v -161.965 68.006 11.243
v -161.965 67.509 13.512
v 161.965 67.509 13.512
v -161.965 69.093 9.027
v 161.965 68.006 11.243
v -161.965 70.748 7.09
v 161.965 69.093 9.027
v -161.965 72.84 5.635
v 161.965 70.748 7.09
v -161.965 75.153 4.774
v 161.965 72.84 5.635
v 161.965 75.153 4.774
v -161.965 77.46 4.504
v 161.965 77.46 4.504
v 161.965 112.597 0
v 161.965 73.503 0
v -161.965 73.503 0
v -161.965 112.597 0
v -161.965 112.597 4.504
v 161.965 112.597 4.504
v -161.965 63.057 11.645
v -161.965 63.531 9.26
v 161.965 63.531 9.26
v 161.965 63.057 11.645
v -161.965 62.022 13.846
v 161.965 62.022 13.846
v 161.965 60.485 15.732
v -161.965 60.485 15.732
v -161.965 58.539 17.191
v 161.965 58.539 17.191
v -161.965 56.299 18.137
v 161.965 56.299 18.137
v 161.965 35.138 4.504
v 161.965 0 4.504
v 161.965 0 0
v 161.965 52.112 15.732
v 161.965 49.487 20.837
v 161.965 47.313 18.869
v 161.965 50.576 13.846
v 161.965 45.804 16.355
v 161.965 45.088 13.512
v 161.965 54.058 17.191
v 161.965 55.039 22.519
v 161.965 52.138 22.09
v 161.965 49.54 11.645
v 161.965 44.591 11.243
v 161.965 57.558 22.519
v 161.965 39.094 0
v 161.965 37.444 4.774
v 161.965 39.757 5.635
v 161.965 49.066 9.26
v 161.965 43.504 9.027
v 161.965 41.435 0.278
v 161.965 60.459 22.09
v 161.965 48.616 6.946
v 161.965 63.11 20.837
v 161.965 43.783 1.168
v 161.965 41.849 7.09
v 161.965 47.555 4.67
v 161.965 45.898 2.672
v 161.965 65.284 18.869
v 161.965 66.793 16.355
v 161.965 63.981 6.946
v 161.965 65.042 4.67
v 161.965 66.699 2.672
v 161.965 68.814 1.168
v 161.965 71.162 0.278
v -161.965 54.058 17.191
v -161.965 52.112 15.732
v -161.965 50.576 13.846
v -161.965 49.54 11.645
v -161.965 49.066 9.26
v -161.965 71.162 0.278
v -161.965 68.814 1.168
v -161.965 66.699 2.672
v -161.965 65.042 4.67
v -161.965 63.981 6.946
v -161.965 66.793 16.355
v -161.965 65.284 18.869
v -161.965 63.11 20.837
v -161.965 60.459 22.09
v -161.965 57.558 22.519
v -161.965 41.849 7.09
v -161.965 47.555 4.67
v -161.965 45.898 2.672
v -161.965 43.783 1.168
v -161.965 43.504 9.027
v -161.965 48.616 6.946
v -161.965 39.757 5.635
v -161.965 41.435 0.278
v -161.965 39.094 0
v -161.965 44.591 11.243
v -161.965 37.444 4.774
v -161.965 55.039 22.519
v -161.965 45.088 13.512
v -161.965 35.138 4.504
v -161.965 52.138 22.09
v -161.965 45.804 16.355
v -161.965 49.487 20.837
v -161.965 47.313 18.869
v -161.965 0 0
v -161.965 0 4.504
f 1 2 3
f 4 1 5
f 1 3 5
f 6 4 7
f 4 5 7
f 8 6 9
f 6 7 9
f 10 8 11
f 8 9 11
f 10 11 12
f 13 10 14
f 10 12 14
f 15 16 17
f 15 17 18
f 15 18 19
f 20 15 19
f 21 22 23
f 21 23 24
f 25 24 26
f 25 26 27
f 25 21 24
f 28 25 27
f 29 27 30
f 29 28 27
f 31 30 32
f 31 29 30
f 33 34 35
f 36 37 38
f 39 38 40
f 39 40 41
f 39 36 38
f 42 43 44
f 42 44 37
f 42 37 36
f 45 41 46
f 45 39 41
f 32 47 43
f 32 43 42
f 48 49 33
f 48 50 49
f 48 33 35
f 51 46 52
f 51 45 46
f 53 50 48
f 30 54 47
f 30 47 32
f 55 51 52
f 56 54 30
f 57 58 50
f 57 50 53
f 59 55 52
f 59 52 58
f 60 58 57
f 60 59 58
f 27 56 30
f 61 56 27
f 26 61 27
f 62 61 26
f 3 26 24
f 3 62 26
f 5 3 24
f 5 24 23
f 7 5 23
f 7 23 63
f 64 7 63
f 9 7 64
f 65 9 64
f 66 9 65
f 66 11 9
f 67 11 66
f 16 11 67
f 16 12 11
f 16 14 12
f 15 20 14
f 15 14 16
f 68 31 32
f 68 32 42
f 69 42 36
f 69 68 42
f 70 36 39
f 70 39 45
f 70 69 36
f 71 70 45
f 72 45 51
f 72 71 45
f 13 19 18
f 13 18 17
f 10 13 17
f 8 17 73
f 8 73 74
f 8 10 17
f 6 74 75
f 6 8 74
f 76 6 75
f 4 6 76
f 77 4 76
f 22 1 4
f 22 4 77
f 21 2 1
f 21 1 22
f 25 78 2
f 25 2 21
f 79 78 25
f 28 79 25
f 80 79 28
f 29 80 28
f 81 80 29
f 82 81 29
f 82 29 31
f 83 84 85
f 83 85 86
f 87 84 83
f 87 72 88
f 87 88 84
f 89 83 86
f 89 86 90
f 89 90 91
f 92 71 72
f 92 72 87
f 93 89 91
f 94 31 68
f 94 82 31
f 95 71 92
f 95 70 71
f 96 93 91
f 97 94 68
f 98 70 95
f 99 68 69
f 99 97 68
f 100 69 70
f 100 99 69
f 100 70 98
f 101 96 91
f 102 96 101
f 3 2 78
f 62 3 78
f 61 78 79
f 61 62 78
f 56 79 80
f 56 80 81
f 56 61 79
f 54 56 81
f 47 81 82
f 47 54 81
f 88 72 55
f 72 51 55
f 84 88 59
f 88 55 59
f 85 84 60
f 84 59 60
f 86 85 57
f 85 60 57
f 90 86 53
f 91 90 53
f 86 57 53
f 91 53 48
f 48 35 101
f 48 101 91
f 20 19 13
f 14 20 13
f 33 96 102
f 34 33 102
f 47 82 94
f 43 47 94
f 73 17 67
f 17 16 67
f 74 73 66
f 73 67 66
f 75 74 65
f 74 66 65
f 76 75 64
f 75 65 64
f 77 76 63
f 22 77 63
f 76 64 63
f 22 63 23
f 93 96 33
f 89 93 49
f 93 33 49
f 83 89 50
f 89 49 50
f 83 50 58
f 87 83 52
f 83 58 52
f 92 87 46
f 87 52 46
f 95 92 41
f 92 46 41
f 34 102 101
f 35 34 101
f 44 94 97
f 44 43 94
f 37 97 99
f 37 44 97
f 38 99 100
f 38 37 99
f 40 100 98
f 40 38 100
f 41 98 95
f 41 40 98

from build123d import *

# Parameters (mm, degrees)
SM_START               = -161.965
SM_BASE_FLANGE_1_DEPTH = 323.93
FILLET_3_R             = 10
FILLET_4_R             = 10
FILLET_5_R             = 10
FILLET_6_R             = 10
FILLET_7_R             = 10


# Read off the part's stored shape, not the designer's step: 基体-法兰1
with BuildPart() as part:
    # 基体-法兰1 outline → 基体-法兰1 (new body)
    with BuildSketch(Plane(origin=(0, 0, 0), x_dir=(0, 0, -1), z_dir=(1, 0, 0)).offset(SM_START)):
        Polygon((-4.503882243, 0), (0, 0), (0, 49.038822429), (-18.519411214, 49.038822429), (-18.519411214, 63.558233643), (0, 63.558233643), (0, 112.597056072), (-4.503882243, 112.597056072), (-4.503882243, 67.558233643), (-22.519411214, 67.558233643), (-22.519411214, 45.038822429), (-4.503882243, 45.038822429), align=None)
    extrude(amount=SM_BASE_FLANGE_1_DEPTH)

    # 圆角3
    fillet_3_edges = [part.edges().sort_by_distance(p)[0] for p in [
        (0, 45.038822429, 22.519411214),
        (0, 67.558233643, 22.519411214),
    ]]
    fillet(fillet_3_edges, radius=FILLET_3_R)

    # 圆角4
    # the kernel refuses this fillet: 10 mm, written as the material it adds along each edge
    with BuildSketch(Plane(origin=(-161.965, 49.038822429, 18.519411214), x_dir=(0, 1, 0), z_dir=(1, 0, 0)), Plane(origin=(-161.965, 63.558233643, 18.519411214), x_dir=(0, 0, -1), z_dir=(1, 0, 0))) as fillet_4_piece_1:
        with BuildLine():
            CenterArc((FILLET_4_R, -FILLET_4_R), FILLET_4_R, 90, 90)
            Line((0, -FILLET_4_R), (0, 0))
            Line((0, 0), (FILLET_4_R, 0))
        make_face()
    extrude(amount=323.93)

    # 圆角5
    fillet_5_edges = [part.edges().sort_by_distance(p)[0] for p in [
        (0, 63.558233643, 0),
        (0, 49.038822429, 0),
    ]]
    fillet(fillet_5_edges, radius=FILLET_5_R)

    # 圆角6
    fillet_6_edges = [part.edges().sort_by_distance(p)[0] for p in [
        (0, 45.038822429, 4.503882243),
    ]]
    fillet(fillet_6_edges, radius=FILLET_6_R)

    # 圆角7
    fillet_7_edges = [part.edges().sort_by_distance(p)[0] for p in [
        (0, 67.558233643, 4.503882243),
    ]]
    fillet(fillet_7_edges, radius=FILLET_7_R)


solid = part.part
